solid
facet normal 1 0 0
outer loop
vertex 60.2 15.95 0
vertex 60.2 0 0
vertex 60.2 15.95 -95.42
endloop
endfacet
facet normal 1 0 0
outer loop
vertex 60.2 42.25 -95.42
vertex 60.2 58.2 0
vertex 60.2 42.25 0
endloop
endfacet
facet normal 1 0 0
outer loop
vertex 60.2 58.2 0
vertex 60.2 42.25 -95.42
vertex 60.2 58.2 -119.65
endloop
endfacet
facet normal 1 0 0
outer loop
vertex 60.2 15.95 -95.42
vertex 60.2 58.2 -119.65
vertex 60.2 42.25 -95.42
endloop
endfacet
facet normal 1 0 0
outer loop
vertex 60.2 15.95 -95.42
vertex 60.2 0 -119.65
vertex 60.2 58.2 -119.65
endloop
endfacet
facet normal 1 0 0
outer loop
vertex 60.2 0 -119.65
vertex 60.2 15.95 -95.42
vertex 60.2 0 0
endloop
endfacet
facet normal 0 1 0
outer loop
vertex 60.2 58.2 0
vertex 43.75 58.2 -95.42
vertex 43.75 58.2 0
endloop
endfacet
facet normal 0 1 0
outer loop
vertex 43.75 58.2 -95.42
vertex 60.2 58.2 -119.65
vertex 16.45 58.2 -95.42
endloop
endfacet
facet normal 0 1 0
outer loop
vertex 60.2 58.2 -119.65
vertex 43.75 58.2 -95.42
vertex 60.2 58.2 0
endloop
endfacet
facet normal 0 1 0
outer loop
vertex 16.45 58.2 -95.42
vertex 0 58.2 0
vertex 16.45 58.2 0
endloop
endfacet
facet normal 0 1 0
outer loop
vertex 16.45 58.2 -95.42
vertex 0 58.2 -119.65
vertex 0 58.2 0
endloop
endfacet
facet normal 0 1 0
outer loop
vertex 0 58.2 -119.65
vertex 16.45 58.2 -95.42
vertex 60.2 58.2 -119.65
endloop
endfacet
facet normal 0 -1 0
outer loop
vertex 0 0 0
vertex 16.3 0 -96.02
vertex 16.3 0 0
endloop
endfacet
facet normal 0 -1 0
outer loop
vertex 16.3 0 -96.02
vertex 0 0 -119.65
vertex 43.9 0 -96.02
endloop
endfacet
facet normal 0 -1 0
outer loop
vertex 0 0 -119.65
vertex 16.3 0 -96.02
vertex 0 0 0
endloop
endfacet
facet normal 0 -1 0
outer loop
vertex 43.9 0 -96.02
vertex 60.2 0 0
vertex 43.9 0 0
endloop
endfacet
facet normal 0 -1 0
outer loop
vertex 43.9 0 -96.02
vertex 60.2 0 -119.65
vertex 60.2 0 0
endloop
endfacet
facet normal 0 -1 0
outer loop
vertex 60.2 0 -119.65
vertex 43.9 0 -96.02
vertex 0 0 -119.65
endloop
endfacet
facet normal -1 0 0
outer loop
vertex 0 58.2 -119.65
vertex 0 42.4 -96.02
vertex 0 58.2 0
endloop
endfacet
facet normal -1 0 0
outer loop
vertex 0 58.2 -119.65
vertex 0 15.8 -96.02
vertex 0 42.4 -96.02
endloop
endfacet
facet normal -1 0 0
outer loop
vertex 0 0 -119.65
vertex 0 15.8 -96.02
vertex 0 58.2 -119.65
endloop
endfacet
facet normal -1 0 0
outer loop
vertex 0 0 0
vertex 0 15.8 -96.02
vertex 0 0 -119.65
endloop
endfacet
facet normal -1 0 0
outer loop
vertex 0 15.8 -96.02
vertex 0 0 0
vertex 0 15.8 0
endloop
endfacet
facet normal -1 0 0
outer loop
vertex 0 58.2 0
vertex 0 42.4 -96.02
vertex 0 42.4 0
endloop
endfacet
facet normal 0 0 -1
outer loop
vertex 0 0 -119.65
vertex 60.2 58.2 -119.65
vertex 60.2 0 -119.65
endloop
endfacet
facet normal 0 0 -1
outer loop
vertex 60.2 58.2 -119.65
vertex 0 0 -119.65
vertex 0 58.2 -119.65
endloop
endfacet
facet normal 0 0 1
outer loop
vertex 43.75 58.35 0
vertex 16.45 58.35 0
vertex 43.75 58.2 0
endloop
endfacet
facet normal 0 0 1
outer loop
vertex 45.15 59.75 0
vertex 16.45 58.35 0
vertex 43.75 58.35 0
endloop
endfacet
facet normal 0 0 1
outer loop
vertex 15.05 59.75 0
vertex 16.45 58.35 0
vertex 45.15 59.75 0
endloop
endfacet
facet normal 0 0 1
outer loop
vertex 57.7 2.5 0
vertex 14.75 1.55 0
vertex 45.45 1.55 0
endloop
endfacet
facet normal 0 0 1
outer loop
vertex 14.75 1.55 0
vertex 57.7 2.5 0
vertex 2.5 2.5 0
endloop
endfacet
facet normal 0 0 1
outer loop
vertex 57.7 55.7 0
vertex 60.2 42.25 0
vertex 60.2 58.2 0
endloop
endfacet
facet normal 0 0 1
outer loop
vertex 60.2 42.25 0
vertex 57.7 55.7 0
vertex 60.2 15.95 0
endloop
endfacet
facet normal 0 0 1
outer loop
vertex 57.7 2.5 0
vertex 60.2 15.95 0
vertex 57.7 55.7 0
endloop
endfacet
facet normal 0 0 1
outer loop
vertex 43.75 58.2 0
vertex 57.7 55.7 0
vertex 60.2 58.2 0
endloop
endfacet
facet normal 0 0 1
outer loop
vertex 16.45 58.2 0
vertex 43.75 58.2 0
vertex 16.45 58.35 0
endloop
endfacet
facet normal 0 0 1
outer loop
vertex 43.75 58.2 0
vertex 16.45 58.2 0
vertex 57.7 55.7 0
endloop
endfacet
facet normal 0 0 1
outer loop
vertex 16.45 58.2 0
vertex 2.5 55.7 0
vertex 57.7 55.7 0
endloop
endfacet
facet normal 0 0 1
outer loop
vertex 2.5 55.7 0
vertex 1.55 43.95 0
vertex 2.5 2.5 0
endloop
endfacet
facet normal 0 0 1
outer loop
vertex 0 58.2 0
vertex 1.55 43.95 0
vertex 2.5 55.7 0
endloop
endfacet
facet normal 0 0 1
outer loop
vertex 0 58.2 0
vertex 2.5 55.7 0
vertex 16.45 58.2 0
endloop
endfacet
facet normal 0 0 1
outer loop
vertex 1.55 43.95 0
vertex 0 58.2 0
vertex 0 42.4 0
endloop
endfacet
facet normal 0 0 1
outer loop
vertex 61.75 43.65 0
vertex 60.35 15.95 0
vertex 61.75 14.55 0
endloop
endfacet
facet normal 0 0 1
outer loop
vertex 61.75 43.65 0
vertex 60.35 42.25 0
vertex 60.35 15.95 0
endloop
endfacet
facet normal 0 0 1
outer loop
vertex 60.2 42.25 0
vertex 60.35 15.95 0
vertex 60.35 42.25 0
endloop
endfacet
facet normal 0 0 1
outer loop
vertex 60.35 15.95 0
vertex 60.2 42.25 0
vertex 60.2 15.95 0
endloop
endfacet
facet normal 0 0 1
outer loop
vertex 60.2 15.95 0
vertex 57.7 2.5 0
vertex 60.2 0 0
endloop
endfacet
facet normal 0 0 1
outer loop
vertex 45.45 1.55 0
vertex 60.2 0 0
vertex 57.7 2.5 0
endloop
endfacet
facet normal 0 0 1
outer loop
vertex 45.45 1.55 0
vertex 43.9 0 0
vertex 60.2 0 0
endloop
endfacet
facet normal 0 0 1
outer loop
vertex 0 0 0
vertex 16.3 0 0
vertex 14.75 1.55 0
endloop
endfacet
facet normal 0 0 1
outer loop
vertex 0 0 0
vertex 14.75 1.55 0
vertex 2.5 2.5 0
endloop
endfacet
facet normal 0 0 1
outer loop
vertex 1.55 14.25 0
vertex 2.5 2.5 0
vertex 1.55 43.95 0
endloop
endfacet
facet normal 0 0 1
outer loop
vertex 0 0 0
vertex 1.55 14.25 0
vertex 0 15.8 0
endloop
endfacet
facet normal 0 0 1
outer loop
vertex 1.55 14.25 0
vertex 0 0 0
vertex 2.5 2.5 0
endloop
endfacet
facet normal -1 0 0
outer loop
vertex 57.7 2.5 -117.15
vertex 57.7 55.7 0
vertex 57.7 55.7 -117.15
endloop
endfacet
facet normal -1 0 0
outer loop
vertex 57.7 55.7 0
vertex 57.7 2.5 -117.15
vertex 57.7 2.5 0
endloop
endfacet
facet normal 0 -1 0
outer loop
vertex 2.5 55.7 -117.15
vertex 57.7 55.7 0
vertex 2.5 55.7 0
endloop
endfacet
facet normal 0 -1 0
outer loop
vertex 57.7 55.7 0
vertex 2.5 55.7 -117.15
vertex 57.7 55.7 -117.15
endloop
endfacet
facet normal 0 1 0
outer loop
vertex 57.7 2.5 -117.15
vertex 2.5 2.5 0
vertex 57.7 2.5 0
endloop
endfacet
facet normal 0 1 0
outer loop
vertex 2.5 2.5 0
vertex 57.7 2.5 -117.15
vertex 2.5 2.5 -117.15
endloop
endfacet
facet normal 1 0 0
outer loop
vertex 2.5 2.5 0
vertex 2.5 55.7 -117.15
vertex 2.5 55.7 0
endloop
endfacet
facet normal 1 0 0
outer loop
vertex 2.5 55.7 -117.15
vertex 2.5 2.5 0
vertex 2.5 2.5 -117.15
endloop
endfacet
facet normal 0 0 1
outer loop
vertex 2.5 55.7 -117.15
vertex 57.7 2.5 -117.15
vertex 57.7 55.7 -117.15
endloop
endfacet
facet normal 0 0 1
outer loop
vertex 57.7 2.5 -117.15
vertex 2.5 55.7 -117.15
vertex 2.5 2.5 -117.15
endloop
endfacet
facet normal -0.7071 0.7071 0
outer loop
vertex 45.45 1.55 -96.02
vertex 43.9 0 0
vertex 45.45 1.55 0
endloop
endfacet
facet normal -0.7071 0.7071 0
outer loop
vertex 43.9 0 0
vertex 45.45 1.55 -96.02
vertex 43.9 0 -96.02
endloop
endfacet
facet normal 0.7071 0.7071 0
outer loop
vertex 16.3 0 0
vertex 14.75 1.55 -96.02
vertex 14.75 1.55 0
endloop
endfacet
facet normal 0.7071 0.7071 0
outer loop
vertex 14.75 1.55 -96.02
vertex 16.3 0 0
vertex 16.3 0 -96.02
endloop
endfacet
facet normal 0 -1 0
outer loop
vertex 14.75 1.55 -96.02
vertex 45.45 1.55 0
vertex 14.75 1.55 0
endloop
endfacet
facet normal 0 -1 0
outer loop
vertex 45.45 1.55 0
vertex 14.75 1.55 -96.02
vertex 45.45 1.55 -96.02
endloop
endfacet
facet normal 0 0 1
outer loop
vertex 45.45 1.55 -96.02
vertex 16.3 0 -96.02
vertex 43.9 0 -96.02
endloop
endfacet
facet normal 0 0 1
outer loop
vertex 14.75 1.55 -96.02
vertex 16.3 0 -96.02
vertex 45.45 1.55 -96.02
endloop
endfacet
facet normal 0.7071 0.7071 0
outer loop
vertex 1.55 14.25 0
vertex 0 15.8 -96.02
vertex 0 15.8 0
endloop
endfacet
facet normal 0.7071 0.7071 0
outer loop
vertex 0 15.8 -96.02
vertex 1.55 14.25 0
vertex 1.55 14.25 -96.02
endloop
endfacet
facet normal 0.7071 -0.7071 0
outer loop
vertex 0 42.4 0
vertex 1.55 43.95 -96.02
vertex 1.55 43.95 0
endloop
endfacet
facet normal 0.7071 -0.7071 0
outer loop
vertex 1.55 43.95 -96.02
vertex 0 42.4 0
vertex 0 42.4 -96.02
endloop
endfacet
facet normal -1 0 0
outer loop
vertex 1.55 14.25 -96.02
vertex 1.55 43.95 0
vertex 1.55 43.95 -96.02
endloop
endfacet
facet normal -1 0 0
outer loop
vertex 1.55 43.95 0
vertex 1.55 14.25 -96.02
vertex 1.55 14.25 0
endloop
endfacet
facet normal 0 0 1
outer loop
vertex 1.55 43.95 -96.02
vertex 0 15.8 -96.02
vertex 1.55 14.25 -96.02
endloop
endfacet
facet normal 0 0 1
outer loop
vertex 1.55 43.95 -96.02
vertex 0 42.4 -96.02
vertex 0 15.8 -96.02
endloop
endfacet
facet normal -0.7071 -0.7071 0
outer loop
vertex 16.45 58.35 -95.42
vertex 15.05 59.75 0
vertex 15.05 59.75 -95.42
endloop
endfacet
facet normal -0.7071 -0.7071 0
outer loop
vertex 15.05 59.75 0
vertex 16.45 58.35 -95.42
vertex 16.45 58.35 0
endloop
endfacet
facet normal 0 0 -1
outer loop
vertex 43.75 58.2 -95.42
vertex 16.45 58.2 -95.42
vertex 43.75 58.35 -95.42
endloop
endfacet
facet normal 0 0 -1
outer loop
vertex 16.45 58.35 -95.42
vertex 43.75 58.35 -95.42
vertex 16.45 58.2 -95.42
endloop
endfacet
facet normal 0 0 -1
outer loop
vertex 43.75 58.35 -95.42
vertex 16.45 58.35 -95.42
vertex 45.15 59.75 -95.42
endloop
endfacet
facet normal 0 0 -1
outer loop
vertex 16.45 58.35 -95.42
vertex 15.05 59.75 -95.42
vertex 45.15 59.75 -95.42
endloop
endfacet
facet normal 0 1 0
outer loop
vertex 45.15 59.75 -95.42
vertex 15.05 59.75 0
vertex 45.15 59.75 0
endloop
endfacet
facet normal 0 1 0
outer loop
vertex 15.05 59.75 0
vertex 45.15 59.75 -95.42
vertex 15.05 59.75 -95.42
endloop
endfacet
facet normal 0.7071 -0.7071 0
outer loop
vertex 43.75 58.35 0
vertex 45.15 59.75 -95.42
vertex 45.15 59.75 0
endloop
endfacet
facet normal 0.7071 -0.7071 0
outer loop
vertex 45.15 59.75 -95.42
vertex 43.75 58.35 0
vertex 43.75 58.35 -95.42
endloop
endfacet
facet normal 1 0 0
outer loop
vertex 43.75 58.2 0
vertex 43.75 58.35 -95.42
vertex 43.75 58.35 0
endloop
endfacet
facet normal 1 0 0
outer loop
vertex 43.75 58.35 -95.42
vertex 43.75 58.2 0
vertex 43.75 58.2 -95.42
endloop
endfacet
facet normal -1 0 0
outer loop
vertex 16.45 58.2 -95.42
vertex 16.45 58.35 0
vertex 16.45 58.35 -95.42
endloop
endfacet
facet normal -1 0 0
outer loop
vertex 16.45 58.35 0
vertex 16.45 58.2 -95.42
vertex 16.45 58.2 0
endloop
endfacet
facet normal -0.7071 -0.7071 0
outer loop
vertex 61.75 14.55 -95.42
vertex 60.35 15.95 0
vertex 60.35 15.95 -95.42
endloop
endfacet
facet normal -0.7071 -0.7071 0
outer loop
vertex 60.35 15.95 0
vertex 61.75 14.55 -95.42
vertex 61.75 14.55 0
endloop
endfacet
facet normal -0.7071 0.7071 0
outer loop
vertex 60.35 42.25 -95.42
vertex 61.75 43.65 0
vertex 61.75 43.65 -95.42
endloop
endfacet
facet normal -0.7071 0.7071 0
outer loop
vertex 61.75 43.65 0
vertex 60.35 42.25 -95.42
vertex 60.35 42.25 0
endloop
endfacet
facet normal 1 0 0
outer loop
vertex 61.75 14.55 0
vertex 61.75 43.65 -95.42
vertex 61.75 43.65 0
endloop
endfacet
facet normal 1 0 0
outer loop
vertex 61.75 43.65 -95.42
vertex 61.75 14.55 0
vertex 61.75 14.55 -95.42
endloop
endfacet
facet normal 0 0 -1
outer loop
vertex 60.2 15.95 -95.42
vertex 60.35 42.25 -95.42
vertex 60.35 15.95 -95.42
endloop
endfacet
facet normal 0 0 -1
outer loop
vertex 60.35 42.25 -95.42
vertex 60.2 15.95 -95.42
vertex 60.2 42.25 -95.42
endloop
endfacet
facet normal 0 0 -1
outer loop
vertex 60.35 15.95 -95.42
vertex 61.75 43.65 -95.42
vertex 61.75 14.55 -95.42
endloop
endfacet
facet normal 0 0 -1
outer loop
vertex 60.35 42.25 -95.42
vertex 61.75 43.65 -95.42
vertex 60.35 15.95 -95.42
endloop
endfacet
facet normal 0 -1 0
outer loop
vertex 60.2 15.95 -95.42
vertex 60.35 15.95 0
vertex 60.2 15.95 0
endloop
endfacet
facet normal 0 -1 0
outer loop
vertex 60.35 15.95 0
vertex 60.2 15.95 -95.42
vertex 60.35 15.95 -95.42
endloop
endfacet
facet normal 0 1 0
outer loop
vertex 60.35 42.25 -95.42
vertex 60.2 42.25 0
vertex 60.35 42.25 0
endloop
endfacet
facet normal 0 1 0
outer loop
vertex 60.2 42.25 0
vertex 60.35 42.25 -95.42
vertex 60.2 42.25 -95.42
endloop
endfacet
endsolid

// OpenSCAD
// file: drawerlib.scad
module carcass(width, depth, height, thickness, slots) {
    t=2*thickness;

    difference () {
        cube([slots*width, depth, height]);
        translate([thickness, -thickness, thickness])
            cube([slots*width-t, depth, height-t]);
    }
}

module interlock(width, depth, height) {
	union() {
		rotate([-90, 0, 0])
			linear_extrude(depth)
				polygon(points=[[0, 0], [height, height], [width-height, height], [width, 0]]);
		translate([height, 0, -height-0.4])
			cube([width-2*height, depth, 0.5]);
	}
}

module housing(width, height, depth, thickness, interlock_thickness, easement, top=true, right=true, bottom=true, left=true, slots=1) {
	t=2*thickness;
	w=width+t;
	h=height+t;
	d=depth+thickness+easement;
	
	difference() {
		carcass(w, d, h, thickness, slots);
		if (bottom) {
			for(i=[0:slots-1]) {
				translate([i*w+w/4-2*easement, -1, interlock_thickness+easement])
					interlock(w/2+4*easement, d*0.8+1+2*easement, interlock_thickness+easement);
			}
		}
		if (left) {
			translate([interlock_thickness+easement, -1, 3*h/4+2*easement])
				rotate([0,90,0])
					interlock(h/2+4*easement, d*0.8+1+2*easement, interlock_thickness+easement);
		}
	}
    if (top) {
        for(i=[0:slots-1]) {
            translate([i*w+w/4, 0, h+interlock_thickness+easement])
                interlock(w/2, d*0.8-2*easement, interlock_thickness);
        }
    }
	if (right) {
		translate([slots*w+interlock_thickness+easement, 0, 3*h/4])
			rotate([0,90,0])
				interlock(h/2, d*0.8-2*easement, interlock_thickness);
	}
}
// main file
use <drawerlib.scad>

rotate([-90, 0, 0])
    housing(width=55.2, height=53.2, depth=117, thickness=2.5, interlock_thickness=1.4, easement=0.15, slots=1);
